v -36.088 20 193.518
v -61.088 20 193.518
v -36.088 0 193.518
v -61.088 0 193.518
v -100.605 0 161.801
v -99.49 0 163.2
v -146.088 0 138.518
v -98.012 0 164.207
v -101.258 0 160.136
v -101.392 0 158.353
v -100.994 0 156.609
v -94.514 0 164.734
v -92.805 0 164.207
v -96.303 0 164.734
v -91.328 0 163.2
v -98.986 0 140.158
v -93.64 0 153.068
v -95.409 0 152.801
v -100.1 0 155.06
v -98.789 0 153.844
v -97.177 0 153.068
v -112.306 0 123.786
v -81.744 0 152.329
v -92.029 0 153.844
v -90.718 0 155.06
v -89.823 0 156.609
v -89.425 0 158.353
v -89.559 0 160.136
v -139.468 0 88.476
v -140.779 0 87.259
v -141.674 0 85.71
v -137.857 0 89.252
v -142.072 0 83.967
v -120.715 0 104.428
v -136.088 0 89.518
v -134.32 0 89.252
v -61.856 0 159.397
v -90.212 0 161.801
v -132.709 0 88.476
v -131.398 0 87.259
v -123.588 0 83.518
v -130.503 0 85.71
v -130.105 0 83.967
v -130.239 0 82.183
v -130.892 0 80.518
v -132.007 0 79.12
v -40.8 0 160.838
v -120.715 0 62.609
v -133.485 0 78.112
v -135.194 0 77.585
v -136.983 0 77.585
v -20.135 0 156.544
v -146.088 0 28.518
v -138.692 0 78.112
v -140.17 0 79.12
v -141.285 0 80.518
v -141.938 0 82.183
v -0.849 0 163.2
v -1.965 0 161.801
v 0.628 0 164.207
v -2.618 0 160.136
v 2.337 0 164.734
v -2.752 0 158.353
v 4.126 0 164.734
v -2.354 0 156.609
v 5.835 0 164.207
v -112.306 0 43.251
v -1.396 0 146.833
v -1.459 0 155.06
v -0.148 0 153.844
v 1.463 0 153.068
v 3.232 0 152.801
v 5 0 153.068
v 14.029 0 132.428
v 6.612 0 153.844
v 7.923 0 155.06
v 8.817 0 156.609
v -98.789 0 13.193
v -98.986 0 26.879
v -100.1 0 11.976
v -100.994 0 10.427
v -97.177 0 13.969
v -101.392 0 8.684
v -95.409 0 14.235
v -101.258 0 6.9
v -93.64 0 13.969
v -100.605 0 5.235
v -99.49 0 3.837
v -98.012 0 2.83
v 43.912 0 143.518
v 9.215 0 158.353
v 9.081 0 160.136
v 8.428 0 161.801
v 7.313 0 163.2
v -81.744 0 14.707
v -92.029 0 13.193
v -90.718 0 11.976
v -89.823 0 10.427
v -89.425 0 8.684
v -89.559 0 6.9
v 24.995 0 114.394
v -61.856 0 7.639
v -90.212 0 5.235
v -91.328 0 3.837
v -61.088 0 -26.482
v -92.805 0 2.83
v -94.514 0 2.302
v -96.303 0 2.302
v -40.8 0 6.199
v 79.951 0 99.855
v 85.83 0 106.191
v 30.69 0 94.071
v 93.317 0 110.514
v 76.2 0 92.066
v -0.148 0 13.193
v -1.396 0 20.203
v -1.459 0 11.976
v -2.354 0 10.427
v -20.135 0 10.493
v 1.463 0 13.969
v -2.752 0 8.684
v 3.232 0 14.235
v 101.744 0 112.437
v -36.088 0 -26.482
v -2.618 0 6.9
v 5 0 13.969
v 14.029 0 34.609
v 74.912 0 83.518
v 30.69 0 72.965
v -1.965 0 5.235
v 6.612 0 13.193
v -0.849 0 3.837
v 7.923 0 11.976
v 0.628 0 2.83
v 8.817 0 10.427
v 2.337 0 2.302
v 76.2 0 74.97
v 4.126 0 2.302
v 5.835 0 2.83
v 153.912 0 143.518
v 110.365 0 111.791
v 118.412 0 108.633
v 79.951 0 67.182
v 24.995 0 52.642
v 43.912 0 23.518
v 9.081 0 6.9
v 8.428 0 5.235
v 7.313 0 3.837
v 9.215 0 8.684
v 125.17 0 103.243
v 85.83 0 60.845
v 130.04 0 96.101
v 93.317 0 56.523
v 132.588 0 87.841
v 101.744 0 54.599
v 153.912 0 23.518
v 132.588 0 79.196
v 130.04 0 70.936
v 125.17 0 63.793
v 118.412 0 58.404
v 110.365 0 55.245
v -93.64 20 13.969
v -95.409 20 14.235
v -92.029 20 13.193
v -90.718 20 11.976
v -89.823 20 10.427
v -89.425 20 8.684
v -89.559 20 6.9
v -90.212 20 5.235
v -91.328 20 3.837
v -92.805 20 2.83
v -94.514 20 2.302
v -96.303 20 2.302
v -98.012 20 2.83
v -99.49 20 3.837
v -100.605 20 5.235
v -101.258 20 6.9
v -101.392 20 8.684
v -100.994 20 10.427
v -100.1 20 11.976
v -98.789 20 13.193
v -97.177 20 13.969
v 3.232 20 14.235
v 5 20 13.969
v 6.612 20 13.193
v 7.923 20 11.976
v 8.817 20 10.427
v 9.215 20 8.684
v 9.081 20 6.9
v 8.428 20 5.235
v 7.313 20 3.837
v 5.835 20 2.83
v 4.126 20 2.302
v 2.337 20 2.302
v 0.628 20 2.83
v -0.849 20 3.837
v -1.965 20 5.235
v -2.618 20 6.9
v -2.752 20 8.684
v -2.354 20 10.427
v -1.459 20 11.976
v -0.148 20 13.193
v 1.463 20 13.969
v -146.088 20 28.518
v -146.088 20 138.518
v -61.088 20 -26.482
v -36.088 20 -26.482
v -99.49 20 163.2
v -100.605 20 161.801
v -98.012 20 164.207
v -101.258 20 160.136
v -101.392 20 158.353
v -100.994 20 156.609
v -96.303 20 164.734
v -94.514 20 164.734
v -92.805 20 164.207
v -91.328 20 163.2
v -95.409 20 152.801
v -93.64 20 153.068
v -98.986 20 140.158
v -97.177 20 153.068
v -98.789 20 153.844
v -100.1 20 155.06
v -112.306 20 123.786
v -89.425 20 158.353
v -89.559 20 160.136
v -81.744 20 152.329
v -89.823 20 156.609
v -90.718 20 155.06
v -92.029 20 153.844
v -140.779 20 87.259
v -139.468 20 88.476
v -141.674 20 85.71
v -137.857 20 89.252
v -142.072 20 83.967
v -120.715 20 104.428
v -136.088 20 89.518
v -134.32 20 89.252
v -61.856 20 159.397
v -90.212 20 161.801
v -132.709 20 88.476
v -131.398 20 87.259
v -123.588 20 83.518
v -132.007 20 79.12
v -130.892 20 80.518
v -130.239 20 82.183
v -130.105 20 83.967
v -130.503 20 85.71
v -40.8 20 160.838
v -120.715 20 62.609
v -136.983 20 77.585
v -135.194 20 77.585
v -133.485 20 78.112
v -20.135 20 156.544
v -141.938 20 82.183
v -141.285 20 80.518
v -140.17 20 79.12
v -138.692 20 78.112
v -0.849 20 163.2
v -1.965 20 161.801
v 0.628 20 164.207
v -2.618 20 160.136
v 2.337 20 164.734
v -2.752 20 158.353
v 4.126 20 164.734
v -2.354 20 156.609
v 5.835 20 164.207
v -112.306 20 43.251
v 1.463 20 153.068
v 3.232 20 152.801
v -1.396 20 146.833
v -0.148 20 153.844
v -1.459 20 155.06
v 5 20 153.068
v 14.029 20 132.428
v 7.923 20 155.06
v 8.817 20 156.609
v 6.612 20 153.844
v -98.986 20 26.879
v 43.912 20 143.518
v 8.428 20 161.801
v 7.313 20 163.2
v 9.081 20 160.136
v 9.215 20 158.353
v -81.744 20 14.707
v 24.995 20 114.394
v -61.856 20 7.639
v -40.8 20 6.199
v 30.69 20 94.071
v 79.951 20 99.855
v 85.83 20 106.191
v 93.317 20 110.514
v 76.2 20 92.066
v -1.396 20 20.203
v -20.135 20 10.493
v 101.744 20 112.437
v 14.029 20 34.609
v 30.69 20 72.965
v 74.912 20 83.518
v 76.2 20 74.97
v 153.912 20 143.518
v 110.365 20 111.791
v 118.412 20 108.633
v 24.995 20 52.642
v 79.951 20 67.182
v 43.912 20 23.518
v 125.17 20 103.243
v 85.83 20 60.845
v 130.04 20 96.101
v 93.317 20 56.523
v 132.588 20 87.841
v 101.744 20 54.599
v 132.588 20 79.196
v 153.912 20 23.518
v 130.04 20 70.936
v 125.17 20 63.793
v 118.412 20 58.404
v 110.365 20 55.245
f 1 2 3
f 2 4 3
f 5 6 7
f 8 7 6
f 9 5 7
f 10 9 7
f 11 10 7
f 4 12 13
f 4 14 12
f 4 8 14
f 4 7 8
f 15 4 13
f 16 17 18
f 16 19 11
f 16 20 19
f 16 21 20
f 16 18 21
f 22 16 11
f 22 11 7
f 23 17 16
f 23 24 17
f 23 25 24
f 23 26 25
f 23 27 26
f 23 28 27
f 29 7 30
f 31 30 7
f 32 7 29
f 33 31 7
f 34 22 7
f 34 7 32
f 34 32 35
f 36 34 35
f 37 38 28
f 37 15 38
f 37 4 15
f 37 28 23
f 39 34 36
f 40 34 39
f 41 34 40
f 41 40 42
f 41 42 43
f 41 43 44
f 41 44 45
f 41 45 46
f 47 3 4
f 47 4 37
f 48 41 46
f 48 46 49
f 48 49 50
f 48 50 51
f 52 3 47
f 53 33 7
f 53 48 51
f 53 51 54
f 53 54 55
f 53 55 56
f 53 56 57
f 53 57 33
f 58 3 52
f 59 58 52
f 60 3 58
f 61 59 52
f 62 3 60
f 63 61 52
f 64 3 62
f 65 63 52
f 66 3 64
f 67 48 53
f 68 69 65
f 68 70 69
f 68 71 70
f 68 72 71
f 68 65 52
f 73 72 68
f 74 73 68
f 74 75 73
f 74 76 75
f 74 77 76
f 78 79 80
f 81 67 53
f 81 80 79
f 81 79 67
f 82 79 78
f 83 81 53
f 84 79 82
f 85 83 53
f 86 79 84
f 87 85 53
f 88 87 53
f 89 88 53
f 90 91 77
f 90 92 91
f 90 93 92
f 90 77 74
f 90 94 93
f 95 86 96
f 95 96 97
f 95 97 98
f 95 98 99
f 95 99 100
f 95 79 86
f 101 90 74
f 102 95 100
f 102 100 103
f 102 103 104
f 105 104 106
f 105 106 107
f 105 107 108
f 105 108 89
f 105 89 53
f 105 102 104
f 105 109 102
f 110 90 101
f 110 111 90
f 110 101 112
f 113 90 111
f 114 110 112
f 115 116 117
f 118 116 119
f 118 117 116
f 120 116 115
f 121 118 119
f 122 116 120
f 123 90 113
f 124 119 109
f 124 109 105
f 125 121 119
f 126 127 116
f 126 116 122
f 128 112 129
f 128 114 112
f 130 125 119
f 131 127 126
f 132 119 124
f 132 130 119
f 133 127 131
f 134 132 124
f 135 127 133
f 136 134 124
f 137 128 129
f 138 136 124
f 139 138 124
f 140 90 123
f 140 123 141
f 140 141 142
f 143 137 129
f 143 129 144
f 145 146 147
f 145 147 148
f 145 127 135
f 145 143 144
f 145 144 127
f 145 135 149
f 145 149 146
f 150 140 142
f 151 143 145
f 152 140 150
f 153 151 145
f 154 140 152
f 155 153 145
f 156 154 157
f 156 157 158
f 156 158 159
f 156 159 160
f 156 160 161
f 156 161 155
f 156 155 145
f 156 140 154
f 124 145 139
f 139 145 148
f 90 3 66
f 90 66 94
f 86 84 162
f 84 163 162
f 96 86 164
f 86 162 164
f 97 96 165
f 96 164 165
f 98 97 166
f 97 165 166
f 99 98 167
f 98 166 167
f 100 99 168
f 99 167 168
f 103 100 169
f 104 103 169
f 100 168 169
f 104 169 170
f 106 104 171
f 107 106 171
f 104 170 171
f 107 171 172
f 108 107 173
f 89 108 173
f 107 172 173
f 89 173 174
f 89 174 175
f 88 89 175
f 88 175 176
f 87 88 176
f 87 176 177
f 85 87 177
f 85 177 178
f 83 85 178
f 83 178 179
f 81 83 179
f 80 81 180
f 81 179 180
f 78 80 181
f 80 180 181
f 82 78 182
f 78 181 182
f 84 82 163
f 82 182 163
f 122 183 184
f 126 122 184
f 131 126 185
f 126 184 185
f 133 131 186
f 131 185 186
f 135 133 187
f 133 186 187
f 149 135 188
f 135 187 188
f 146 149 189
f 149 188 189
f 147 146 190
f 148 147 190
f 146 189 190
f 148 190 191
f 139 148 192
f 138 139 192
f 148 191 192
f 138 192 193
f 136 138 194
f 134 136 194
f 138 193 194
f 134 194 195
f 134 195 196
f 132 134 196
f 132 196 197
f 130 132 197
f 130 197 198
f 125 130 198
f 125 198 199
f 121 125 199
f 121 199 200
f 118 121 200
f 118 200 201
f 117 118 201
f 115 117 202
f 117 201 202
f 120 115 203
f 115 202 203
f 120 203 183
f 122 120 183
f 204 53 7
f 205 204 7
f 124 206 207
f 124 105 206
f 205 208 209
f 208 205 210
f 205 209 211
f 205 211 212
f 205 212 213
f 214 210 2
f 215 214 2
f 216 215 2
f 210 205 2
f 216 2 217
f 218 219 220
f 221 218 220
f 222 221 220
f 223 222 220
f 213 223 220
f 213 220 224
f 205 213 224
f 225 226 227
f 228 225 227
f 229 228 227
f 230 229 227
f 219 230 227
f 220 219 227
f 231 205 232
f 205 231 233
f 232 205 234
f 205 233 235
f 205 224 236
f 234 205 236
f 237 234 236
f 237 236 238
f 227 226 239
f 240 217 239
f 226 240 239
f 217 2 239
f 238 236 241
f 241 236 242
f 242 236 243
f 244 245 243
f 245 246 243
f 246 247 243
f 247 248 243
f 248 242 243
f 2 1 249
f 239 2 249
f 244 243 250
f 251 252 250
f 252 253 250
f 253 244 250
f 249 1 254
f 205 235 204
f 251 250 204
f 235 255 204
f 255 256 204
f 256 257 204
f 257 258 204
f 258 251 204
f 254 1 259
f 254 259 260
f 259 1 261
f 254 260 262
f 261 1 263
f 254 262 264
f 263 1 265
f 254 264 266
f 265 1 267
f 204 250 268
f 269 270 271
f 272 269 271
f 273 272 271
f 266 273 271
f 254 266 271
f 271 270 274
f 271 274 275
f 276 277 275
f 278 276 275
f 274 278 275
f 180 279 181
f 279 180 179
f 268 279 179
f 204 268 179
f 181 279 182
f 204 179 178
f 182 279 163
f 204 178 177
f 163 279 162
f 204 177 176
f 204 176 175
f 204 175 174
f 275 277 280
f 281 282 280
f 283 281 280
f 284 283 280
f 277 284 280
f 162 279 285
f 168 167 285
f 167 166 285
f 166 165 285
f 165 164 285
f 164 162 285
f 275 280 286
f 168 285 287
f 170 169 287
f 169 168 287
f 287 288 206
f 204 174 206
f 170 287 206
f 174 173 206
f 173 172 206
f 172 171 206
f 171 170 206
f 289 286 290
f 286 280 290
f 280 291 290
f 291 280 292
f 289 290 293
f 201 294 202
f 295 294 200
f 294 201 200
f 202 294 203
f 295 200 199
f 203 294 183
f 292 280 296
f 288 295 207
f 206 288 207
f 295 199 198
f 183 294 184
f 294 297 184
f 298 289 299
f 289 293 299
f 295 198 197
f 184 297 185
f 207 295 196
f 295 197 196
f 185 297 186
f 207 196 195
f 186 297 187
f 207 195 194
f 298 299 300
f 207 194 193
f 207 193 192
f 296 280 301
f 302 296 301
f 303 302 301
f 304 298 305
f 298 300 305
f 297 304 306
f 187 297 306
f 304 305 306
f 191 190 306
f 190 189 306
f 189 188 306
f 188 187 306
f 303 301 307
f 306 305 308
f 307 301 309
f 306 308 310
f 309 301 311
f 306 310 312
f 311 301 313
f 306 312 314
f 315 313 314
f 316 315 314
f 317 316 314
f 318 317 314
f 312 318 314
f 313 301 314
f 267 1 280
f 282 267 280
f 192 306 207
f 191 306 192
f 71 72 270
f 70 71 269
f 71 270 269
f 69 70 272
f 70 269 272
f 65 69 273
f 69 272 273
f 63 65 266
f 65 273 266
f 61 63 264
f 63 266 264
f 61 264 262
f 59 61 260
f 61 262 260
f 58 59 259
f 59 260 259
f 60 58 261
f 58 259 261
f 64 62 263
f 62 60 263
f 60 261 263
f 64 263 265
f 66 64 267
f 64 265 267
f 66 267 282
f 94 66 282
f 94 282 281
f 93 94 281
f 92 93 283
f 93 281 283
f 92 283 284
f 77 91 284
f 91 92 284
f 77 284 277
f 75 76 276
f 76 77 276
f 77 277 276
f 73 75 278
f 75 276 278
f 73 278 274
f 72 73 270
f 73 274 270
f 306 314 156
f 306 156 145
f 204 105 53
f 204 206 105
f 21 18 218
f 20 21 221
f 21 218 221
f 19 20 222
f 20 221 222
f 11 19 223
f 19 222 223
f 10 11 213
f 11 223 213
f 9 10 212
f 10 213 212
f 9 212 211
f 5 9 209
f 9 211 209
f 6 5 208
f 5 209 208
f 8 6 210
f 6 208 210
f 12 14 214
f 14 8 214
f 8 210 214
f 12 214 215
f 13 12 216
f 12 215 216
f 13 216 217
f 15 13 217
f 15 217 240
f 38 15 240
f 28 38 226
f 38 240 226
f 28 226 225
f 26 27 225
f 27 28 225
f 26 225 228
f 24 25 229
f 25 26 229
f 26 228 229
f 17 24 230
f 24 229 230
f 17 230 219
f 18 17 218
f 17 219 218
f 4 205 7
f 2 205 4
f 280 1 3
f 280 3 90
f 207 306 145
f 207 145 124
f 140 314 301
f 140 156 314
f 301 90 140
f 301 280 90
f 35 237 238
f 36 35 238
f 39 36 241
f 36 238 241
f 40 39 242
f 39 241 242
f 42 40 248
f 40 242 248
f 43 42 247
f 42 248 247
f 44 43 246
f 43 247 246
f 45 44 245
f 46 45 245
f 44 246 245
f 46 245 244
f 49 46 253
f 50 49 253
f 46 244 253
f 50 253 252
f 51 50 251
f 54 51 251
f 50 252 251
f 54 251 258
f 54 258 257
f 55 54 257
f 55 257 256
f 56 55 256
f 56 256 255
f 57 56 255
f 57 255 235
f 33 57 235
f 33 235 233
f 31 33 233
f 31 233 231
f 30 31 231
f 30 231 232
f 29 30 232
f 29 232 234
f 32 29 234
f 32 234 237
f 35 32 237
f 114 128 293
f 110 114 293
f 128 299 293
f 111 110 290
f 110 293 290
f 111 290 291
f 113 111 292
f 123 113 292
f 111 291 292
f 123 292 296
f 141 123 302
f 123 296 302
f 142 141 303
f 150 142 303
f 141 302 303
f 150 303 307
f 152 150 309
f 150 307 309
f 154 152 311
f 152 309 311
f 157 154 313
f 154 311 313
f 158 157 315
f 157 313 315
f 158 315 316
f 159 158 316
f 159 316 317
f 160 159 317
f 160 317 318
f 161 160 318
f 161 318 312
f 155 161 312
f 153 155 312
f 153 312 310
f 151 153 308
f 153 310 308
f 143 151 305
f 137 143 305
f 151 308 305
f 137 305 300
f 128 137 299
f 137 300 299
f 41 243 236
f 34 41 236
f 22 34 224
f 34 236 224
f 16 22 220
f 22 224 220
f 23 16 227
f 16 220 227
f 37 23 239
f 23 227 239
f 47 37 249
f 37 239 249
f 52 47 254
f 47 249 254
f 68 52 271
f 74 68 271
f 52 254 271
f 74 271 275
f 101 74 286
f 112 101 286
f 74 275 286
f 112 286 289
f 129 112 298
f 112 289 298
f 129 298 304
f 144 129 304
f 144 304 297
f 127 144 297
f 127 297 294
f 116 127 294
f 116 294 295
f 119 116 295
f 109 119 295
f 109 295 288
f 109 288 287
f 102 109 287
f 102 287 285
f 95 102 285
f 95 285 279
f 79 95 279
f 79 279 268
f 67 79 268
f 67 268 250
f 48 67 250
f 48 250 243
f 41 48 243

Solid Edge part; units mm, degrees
sketch "Sketch1" plane through (0, 0, 0) normal (0, -1, 0) x (1, 0, 0)
  line L0 (-146.0885, -26.4817) -> (153.9115, -26.4817)
  line L1 (153.9115, -26.4817) -> (153.9115, 193.5183)
  line L2 (-146.0885, 193.5183) -> (153.9115, 193.5183)
  line L3 (-146.0885, -26.4817) -> (-146.0885, 193.5183)
  dimension "D1" = 300
  dimension "D2" = 220
extrude "Protrusion1" add sketch "Sketch1" against normal blind 20
sketch "Sketch2" plane through (3.9115, 20, 48.5183) normal (0, 1, 0) x (-1, 0, 0)
  circle A0 centre (50, 35) radius 77.5
  dimension "D1" = 100
  dimension "D2" = 155
extrude "Cutout1" cut sketch "Sketch2" against normal through all
sketch "Sketch3" plane through (3.9115, 20, 38.5183) normal (0, 1, 0) x (-1, 0, 0)
  circle A0 centre (-100, 45) radius 29
  dimension "D1" = 50
  dimension "D2" = 58
extrude "Cutout2" cut sketch "Sketch3" against normal through all
sketch "Sketch4" plane through (3.9115, 20, 73.5183) normal (0, 1, 0) x (-1, 0, 0)
  line L0 (150, 65) -> (65, 120)
  line L1 (65, 120) -> (150, 120)
  line L2 (150, 120) -> (150, 65)
  line L3 (-150, 120) -> (-150, 70)
  line L4 (-40, 70) -> (-150, 70)
  line L5 (40, 120) -> (-40, 70)
  line L6 (-150, 120) -> (40, 120)
  dimension "D1" = 190
  dimension "D2" = 85
  dimension "D3" = 55
  dimension "D4" = 110
  dimension "D5" = 50
extrude "Cutout3" cut sketch "Sketch4" against normal through all
hole "Hole1" at (-136.0885, 20, 83.5183) direction (0, -1, 0) diameter 12 end up to next
hole "Hole2" at (-95.4086, 20, 8.2354) direction (0, -1, 0) diameter 12 end up to next
hole "Hole3" at (3.2316, 20, 8.2354) direction (0, -1, 0) diameter 12 end up to next
mirror "Mirror1" about plane through (-73.5885, 5, 83.5183) normal (0, 0, 1) of "Cutout3", "Hole1", "Hole2", "Hole3"
